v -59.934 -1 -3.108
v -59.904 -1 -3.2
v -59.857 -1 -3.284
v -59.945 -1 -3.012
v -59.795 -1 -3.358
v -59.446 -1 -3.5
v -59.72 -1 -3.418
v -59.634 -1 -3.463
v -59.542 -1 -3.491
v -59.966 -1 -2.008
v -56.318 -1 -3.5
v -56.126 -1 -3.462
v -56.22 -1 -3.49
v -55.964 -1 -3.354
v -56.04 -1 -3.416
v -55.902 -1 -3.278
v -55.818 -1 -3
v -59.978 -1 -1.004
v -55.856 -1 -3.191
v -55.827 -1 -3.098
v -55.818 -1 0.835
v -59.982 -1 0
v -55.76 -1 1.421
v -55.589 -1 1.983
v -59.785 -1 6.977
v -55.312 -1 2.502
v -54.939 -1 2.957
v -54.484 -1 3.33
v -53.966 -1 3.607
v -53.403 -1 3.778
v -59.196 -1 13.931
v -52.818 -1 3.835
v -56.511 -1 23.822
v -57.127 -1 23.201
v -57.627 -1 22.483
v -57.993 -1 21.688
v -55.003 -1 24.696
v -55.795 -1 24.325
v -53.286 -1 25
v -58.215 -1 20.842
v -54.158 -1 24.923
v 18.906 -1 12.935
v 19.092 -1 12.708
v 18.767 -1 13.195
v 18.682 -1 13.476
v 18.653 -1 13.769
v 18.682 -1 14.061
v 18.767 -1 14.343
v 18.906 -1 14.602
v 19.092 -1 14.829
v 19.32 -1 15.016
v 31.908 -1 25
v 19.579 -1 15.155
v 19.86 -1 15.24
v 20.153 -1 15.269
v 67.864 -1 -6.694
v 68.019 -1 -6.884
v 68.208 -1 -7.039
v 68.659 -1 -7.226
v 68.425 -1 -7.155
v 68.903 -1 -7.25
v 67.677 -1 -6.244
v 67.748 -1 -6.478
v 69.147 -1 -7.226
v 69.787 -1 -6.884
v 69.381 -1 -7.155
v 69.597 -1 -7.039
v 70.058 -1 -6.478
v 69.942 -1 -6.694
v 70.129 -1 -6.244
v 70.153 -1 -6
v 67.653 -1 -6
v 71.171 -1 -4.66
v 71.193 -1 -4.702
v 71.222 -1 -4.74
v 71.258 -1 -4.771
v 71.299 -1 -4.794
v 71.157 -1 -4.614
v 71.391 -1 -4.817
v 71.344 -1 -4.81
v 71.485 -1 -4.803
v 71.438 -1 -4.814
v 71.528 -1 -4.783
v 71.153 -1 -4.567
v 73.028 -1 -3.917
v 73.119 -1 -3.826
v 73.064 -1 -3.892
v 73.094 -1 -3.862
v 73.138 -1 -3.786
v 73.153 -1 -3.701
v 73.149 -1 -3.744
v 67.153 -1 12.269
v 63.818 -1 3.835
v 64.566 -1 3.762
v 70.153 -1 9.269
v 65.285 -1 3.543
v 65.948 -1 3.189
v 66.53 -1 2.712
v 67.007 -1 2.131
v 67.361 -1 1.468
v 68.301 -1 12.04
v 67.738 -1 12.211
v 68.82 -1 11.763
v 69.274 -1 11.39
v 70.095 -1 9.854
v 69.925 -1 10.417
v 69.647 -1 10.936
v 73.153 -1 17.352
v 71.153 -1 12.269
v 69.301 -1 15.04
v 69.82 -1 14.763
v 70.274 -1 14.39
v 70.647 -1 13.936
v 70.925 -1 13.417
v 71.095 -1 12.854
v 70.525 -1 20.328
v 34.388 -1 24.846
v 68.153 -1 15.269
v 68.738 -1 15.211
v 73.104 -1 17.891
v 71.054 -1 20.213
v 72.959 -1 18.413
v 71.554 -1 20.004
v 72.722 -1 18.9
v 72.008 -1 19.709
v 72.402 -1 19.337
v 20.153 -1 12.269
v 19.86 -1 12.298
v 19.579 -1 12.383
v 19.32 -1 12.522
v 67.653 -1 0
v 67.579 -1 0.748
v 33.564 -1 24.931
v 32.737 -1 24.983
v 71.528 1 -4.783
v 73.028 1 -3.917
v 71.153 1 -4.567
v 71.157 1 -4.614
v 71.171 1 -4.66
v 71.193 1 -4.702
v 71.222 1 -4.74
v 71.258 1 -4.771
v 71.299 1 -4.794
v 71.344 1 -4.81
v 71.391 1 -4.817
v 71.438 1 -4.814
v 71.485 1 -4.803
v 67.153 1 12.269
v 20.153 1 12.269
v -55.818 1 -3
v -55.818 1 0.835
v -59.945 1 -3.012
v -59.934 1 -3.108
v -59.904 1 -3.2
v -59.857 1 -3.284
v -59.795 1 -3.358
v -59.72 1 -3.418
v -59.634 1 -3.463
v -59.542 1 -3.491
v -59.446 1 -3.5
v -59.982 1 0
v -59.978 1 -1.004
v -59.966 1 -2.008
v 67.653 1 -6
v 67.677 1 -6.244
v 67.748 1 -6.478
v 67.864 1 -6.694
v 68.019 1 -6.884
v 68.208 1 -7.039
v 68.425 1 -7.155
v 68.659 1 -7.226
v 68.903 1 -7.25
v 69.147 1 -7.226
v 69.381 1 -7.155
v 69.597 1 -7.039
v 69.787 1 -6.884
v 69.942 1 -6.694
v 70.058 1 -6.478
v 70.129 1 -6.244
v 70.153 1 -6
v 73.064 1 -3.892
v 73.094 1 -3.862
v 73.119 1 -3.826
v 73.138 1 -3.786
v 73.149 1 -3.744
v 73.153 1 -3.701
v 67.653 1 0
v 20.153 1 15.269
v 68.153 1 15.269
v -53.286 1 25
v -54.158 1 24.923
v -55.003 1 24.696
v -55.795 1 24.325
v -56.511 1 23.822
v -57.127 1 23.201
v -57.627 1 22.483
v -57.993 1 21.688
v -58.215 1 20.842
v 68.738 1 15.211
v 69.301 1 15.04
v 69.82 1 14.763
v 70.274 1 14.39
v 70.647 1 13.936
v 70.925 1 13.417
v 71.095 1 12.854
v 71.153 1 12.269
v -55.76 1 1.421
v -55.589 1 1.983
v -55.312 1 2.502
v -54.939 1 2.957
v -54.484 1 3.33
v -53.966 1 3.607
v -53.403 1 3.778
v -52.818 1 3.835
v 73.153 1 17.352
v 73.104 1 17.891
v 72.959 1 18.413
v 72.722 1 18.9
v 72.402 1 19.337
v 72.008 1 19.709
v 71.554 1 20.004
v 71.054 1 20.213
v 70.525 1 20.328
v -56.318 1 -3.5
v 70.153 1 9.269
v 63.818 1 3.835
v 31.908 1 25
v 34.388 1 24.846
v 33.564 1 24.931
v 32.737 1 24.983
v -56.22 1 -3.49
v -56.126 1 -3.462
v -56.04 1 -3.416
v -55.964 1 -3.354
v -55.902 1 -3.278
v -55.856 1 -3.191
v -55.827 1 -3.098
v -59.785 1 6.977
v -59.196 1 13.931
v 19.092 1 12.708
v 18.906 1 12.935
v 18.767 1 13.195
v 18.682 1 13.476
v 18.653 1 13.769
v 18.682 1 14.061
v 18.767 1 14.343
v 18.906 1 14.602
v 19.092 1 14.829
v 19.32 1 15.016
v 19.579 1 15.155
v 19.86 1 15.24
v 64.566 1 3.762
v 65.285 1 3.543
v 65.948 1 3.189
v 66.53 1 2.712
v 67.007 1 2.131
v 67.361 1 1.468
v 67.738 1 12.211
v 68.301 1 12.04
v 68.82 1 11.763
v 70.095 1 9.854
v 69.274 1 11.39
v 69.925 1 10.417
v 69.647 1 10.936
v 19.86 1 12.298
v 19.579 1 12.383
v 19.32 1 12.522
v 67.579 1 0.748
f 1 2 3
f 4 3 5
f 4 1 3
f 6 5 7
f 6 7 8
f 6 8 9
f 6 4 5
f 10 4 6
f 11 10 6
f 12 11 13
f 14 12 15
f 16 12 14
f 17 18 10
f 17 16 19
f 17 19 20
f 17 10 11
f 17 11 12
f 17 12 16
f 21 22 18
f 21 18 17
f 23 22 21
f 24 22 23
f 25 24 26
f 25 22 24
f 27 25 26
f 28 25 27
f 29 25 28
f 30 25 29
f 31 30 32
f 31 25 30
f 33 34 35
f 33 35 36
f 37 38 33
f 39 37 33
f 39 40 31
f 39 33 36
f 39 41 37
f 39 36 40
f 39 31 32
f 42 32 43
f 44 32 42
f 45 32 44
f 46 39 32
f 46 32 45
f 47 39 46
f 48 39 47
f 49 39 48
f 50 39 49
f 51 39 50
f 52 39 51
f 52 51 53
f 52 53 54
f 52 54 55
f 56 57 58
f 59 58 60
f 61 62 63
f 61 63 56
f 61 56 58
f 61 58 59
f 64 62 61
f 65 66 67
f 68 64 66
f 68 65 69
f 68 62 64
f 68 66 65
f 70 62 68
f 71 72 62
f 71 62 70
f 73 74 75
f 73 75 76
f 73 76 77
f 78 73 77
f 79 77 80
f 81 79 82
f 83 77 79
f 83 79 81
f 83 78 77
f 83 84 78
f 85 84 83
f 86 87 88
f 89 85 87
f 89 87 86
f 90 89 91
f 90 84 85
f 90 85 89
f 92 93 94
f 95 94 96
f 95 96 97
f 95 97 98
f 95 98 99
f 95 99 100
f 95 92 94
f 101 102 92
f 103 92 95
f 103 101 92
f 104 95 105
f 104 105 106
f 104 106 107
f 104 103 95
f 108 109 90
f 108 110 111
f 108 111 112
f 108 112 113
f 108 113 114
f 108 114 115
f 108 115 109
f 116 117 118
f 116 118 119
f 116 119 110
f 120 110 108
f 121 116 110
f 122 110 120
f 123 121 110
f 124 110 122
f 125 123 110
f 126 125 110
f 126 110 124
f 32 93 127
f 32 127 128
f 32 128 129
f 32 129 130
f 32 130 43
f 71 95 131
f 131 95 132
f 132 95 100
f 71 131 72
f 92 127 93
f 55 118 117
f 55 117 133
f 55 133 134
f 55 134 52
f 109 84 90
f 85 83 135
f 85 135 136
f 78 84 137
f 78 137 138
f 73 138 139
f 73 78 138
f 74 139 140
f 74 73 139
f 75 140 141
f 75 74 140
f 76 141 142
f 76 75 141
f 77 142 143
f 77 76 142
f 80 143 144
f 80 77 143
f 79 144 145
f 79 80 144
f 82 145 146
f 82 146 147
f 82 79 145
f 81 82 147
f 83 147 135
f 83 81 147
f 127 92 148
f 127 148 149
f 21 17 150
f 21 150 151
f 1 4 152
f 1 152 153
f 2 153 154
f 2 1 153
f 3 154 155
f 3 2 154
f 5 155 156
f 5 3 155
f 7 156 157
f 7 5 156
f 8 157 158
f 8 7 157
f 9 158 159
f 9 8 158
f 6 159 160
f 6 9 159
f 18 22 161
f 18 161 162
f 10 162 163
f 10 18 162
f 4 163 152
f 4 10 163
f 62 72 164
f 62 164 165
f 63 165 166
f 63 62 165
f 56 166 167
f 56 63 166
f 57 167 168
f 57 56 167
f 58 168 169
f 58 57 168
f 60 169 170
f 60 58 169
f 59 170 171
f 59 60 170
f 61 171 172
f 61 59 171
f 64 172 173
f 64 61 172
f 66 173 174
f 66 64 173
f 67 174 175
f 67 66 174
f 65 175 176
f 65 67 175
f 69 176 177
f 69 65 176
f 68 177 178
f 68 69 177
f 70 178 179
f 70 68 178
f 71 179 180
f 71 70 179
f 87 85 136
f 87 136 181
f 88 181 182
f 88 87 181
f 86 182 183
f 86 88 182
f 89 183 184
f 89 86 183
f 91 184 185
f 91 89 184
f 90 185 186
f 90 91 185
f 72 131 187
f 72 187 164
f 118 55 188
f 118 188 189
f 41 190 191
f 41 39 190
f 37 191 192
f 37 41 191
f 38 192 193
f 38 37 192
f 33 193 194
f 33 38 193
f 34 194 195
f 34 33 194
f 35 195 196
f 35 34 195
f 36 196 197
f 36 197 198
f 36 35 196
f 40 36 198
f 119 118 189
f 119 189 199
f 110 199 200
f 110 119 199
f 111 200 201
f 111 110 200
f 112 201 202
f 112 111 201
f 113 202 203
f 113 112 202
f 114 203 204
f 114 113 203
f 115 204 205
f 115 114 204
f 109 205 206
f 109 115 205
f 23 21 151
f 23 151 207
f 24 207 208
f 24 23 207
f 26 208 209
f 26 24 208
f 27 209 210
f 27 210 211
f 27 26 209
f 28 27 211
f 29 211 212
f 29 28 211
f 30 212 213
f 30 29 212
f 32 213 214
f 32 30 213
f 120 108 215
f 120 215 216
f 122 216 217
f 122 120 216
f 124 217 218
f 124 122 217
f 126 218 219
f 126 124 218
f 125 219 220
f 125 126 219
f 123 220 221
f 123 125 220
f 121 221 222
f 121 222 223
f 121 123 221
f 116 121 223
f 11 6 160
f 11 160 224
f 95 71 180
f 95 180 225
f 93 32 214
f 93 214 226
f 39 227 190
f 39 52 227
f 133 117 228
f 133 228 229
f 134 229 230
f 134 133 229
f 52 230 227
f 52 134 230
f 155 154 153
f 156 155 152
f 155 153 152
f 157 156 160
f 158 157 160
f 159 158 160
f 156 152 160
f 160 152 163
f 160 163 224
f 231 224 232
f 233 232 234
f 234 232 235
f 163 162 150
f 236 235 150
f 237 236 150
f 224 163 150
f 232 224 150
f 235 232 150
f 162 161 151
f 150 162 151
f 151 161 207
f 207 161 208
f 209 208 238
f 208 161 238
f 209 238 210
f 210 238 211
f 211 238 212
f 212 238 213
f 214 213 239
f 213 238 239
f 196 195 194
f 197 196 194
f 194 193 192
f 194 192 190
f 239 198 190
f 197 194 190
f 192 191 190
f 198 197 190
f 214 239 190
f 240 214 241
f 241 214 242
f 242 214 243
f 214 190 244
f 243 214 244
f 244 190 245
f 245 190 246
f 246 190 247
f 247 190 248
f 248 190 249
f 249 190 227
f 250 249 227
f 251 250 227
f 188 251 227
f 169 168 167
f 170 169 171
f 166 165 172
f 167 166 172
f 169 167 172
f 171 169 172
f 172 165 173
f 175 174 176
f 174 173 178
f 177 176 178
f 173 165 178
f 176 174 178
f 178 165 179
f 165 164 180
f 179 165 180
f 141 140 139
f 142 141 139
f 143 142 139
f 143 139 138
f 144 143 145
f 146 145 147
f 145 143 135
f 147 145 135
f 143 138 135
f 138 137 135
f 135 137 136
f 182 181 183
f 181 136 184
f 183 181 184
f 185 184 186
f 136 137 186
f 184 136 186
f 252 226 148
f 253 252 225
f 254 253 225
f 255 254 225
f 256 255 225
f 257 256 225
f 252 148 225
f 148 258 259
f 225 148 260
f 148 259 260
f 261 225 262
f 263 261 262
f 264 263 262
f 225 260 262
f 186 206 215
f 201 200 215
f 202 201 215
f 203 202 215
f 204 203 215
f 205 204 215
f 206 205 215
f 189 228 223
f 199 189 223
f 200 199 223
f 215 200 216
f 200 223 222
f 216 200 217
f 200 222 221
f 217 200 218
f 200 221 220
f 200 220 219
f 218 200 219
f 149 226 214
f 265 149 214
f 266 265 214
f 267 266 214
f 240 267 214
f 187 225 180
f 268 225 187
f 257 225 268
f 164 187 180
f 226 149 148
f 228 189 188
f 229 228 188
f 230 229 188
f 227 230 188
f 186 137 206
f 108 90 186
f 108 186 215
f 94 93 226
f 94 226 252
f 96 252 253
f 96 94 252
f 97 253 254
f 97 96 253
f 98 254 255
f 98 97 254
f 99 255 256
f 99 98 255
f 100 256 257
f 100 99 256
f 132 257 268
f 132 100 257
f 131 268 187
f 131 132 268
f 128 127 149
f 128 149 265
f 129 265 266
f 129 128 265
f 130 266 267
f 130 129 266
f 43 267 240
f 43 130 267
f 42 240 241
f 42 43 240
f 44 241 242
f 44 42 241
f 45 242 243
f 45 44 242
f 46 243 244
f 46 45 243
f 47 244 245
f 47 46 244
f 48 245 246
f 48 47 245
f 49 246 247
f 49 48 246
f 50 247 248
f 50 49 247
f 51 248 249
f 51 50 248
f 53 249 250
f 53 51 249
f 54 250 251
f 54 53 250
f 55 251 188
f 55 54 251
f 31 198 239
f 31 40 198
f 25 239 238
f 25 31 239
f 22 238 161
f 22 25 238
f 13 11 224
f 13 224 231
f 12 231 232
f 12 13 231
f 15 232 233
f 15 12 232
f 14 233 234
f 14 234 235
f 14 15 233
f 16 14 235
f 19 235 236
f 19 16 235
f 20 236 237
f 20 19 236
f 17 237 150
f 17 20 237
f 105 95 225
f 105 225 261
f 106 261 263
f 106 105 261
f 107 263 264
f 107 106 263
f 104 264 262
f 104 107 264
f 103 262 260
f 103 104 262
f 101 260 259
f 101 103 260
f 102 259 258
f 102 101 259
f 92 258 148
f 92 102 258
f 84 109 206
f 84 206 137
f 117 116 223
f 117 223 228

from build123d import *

# Parameters (mm, degrees)
F1_DEPTH = 1


# Not quite as in the source:
# - a feature names something its author has since deleted; it is built from what else it names


with BuildPart() as f1:
    # F0 (on Front) → F1 (new body, symmetric)
    with BuildSketch(Plane.XZ):
        with BuildLine():
            ThreePointArc((-58.215127866, 20.8417536759), (-59.5395660257, 10.4582609311), (-59.9821, 0))
            ThreePointArc((-59.9821, 0), (-59.9729371877, -1.5061942231), (-59.9454501071, -3.0121654896))
            ThreePointArc((-59.9454501071, -3.0121654896), (-59.7948238827, -3.3578286914), (-59.4455981282, -3.5))
            Line((-59.4455981282, -3.5), (-56.3175, -3.5))
            ThreePointArc((-56.3175, -3.5), (-55.9639466094, -3.3535533906), (-55.8175, -3))
            Line((-55.8175, -3), (-55.8175, 0.8354))
            ThreePointArc((-55.8175, 0.8354), (-54.9388203436, 2.9567203436), (-52.8175, 3.8354))
            Line((-52.8175, 3.8354), (63.8175, 3.8354))
            ThreePointArc((63.8175, 3.8354), (66.5295373486, 2.7120373486), (67.6529, 0))
            Line((67.6529, 0), (67.6529, -6))
            ThreePointArc((67.6529, -6), (68.9029, -7.25), (70.1529, -6))
            Line((70.1529, -6), (70.1529, 9.2687909752))
            ThreePointArc((70.1529, 9.2687909752), (69.2742203436, 11.3901113188), (67.1529, 12.2687909752))
            Line((67.1529, 12.2687909752), (20.1529, 12.2687909752))
            ThreePointArc((20.1529, 12.2687909752), (18.6529, 13.7687909752), (20.1529, 15.2687909752))
            Line((20.1529, 15.2687909752), (68.1529, 15.2687909752))
            ThreePointArc((68.1529, 15.2687909752), (70.2742203436, 14.3901113188), (71.1529, 12.2687909752))
            Line((71.1529, 12.2687909752), (71.1529, -4.5669872981))
            ThreePointArc((71.1529, -4.5669872981), (71.2779, -4.7834936491), (71.5279, -4.7834936491))
            Line((71.5279, -4.7834936491), (73.0279, -3.9174682453))
            ThreePointArc((73.0279, -3.9174682453), (73.1194063509, -3.8259618943), (73.1529, -3.7009618943))
            Line((73.1529, -3.7009618943), (73.1529, 17.3516533444))
            ThreePointArc((73.1529, 17.3516533444), (72.4019345274, 19.3370610341), (70.5250042038, 20.3284869745))
            Line((70.5250042038, 20.3284869745), (34.3884397258, 24.8455575343))
            ThreePointArc((34.3884397258, 24.8455575343), (33.1504938652, 24.961352042), (31.907745034, 25))
            Line((31.907745034, 25), (-53.2864920761, 25))
            ThreePointArc((-53.2864920761, 25), (-56.510715364, 23.8215682893), (-58.215127866, 20.8417536759))
        make_face()
    extrude(amount=F1_DEPTH, both=True)


solid = f1.part
